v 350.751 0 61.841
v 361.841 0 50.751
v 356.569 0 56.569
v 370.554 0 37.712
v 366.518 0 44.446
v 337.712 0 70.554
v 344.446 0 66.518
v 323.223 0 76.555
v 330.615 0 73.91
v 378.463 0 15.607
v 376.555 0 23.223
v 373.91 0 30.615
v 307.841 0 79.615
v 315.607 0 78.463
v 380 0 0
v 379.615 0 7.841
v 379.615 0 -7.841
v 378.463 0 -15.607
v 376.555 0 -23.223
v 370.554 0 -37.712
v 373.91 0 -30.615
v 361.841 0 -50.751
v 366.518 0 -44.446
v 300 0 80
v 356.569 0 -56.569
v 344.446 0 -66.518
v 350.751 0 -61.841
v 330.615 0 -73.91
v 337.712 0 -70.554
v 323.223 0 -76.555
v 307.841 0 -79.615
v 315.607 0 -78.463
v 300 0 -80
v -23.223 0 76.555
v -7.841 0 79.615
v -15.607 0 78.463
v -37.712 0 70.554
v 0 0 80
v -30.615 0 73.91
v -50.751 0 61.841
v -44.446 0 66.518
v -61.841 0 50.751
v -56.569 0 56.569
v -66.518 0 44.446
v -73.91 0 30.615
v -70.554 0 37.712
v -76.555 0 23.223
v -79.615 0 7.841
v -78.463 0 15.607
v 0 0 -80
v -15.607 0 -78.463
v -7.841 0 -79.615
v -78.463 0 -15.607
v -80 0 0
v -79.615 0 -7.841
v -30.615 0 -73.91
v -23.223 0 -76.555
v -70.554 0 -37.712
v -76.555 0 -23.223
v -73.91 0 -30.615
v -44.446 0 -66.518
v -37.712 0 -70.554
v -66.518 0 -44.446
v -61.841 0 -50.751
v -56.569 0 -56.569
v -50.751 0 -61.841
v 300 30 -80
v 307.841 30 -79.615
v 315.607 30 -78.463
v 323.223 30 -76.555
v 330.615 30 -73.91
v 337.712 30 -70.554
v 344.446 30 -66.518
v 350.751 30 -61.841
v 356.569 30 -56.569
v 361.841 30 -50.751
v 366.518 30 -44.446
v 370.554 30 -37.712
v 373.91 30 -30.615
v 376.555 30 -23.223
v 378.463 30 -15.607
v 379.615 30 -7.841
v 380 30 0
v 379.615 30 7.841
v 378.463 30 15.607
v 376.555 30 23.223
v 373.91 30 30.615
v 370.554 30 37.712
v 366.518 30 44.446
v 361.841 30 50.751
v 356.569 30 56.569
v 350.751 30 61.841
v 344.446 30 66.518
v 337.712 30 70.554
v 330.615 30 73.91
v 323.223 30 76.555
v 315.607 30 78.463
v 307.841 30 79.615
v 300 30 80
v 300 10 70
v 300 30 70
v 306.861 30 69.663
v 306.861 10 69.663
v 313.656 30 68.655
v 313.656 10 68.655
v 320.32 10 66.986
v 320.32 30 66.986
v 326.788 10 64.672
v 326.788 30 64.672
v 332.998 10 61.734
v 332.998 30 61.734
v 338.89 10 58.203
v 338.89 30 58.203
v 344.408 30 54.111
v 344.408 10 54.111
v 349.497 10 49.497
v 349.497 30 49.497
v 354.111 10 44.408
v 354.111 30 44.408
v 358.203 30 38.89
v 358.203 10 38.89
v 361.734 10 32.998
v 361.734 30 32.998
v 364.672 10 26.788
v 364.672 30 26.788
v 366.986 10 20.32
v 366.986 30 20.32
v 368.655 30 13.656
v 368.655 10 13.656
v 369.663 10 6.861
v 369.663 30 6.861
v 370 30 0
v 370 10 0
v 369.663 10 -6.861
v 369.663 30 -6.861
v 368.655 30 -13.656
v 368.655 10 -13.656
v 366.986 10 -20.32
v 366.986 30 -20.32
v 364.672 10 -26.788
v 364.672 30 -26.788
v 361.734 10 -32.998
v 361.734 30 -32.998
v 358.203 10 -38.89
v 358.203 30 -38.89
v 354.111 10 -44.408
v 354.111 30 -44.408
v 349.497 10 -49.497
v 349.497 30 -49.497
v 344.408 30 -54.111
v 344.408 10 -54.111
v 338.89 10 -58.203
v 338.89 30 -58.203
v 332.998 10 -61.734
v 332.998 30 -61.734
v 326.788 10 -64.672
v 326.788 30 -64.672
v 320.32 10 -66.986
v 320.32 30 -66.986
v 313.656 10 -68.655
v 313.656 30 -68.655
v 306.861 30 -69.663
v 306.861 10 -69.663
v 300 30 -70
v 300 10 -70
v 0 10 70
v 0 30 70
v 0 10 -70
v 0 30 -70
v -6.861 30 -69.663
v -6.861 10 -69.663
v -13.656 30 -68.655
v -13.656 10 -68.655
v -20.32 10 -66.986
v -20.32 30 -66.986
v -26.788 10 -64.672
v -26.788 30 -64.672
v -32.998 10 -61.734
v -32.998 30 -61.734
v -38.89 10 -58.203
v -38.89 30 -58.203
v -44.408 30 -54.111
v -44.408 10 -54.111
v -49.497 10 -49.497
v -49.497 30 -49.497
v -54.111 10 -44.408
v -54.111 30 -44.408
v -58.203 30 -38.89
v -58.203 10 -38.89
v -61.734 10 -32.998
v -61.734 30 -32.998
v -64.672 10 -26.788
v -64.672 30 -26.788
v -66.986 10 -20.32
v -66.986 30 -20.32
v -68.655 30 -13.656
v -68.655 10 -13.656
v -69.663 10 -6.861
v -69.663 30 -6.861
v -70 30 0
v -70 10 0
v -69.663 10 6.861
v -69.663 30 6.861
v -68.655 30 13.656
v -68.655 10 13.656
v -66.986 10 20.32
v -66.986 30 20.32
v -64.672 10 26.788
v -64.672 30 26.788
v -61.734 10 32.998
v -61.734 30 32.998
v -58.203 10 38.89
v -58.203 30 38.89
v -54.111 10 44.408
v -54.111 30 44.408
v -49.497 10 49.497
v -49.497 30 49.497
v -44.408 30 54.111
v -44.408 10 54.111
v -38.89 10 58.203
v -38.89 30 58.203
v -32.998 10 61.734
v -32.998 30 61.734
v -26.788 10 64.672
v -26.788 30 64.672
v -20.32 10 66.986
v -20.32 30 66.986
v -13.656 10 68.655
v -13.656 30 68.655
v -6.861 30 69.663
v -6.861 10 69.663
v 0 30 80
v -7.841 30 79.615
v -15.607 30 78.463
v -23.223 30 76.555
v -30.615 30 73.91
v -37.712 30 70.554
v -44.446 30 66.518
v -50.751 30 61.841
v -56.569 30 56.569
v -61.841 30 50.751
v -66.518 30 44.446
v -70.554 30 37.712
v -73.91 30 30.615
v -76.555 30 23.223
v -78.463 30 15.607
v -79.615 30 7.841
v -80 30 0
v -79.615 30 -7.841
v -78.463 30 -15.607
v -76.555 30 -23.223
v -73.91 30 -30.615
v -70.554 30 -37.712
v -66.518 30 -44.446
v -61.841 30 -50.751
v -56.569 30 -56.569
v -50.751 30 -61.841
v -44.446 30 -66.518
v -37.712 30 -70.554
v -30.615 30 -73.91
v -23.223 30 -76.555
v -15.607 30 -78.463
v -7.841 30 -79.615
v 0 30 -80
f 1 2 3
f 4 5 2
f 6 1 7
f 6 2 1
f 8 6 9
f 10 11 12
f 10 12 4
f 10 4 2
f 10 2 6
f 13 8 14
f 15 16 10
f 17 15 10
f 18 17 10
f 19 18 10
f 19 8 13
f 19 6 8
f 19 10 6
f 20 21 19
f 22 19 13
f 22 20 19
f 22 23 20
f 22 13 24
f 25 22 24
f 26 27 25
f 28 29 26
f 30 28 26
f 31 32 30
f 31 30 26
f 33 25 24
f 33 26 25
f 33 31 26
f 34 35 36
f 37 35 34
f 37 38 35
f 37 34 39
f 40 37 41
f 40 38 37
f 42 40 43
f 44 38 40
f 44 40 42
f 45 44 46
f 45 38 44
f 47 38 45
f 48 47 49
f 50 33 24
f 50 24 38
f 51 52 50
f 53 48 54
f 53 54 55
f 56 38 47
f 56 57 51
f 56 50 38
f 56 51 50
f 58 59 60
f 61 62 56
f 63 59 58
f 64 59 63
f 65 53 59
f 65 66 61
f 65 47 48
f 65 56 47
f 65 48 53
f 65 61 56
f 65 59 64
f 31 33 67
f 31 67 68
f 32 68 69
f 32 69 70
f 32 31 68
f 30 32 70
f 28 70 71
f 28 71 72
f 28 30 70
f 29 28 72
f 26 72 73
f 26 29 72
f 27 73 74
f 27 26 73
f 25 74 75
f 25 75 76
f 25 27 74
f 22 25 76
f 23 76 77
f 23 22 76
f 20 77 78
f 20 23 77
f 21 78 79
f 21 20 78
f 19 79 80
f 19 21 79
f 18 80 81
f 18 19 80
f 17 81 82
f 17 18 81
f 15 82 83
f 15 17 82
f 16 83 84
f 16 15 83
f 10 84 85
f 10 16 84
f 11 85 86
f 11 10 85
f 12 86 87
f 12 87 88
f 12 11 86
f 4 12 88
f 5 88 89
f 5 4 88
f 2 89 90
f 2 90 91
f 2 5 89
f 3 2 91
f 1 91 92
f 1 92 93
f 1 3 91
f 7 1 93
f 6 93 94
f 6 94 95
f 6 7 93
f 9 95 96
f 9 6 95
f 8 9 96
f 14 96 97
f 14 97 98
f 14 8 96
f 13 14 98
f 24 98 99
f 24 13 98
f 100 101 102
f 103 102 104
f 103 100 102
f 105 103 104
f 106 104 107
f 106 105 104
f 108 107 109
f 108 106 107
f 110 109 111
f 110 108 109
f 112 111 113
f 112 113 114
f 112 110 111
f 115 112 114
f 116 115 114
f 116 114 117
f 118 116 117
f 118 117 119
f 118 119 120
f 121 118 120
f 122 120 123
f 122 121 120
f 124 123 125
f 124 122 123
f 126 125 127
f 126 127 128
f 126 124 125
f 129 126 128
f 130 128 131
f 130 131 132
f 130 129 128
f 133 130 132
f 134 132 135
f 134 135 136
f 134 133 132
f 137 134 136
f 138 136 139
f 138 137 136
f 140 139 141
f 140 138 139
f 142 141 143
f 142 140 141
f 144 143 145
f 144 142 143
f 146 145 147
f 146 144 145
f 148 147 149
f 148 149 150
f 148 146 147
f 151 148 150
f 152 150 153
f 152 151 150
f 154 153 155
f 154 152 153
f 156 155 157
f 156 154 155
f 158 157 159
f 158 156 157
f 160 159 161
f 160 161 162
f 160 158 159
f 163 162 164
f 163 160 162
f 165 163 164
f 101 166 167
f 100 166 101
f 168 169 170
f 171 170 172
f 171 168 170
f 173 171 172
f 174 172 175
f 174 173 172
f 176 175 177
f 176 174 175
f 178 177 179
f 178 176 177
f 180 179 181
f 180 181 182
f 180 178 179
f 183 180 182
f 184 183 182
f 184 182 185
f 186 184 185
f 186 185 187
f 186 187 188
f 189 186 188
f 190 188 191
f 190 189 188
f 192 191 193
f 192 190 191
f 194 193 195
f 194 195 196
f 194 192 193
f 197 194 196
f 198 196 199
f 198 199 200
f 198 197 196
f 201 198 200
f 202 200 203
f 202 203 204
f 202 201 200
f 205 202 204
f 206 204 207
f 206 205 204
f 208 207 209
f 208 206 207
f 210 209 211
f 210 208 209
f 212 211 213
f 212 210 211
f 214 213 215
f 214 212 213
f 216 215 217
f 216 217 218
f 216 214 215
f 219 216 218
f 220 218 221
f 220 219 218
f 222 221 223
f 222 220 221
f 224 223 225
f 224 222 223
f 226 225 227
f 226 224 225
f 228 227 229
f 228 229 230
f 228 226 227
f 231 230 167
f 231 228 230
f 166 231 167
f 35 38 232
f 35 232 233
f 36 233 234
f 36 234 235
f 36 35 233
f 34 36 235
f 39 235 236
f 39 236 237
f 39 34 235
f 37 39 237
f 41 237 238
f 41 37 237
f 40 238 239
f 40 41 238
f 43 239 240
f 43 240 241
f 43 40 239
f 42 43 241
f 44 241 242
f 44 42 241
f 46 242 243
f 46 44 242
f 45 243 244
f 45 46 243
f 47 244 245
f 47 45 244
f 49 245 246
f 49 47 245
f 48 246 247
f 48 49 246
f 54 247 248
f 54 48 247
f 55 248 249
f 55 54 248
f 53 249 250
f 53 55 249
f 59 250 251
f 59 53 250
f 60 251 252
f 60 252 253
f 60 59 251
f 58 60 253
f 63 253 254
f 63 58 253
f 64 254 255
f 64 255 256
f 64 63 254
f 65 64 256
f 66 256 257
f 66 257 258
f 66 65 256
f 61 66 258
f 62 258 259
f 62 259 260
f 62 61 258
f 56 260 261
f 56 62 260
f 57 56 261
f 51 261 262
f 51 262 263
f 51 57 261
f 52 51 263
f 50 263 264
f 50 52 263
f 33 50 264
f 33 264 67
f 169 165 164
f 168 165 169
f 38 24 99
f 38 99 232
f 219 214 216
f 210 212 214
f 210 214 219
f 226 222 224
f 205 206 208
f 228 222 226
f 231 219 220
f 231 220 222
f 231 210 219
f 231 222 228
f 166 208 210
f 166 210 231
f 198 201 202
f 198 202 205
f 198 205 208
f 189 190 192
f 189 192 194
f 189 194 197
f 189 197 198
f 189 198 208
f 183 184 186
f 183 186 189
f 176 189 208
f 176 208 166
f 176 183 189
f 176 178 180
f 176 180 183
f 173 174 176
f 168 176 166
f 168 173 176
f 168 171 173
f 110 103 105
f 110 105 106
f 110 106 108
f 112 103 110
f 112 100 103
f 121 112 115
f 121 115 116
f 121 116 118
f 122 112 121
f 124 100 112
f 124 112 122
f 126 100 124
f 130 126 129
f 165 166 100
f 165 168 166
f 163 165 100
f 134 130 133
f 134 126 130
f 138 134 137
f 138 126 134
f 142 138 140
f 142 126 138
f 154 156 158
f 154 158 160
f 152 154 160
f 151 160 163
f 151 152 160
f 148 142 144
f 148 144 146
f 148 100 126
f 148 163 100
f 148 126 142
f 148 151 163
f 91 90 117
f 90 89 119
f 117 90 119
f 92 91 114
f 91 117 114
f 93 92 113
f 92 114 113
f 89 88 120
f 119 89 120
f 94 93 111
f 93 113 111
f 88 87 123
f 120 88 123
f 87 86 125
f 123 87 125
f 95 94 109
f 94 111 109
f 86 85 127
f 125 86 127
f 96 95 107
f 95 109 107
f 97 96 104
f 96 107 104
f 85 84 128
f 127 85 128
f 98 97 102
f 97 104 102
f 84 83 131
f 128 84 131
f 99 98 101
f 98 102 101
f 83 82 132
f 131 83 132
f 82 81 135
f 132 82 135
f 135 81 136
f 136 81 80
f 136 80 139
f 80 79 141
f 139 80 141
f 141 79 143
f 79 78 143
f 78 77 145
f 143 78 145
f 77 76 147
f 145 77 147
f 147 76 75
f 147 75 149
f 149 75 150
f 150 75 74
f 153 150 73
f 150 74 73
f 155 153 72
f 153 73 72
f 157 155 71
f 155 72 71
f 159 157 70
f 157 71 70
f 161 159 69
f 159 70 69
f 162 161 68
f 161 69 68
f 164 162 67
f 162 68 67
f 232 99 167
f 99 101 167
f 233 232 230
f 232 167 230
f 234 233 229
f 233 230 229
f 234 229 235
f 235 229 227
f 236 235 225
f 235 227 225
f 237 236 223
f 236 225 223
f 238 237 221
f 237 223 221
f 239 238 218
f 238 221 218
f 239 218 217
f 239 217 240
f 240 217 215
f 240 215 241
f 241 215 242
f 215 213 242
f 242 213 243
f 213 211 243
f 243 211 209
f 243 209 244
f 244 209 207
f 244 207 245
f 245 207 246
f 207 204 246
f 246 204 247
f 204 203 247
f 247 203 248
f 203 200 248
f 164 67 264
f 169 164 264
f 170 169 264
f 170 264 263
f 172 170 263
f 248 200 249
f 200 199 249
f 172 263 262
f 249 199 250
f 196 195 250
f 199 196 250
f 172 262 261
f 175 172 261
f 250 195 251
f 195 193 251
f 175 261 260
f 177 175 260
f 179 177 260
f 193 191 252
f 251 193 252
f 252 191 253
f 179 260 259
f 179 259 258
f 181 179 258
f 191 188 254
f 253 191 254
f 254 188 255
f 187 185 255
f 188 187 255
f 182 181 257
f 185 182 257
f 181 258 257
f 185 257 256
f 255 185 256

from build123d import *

# Parameters (mm, degrees)
BOSS_EXTRUDE1_DEPTH = 30
BOSS_EXTRUDE2_START = -20
BOSS_EXTRUDE2_DEPTH = 20


# Read off the part's stored shape, not the designer's step: Boss-Extrude2
with BuildPart() as part:
    # Sketch1 → Boss-Extrude1 (new body)
    with BuildSketch(Plane(origin=(0, 0, 0), x_dir=(1, 0, 0), z_dir=(0, 1, 0))):
        with BuildLine():
            Line((0, 80), (300, 80))
            ThreePointArc((300, 80), (380, 0), (300, -80))
            Line((300, -80), (0, -80))
            ThreePointArc((0, -80), (-80, 0), (0, 80))
        make_face()
    extrude(amount=BOSS_EXTRUDE1_DEPTH)

    # Boss-Extrude2 outline → Boss-Extrude2 (cut)
    with BuildSketch(Plane(origin=(0, 30, 0), x_dir=(1, 0, 0), z_dir=(0, 1, 0)).offset(BOSS_EXTRUDE2_START)):
        with BuildLine():
            Line((0, -70), (300, -70))
            ThreePointArc((300, -70), (370, 0), (300, 70))
            Line((300, 70), (0, 70))
            ThreePointArc((0, 70), (-70, 0), (0, -70))
        make_face()
    extrude(amount=BOSS_EXTRUDE2_DEPTH, mode=Mode.SUBTRACT)


solid = part.part
